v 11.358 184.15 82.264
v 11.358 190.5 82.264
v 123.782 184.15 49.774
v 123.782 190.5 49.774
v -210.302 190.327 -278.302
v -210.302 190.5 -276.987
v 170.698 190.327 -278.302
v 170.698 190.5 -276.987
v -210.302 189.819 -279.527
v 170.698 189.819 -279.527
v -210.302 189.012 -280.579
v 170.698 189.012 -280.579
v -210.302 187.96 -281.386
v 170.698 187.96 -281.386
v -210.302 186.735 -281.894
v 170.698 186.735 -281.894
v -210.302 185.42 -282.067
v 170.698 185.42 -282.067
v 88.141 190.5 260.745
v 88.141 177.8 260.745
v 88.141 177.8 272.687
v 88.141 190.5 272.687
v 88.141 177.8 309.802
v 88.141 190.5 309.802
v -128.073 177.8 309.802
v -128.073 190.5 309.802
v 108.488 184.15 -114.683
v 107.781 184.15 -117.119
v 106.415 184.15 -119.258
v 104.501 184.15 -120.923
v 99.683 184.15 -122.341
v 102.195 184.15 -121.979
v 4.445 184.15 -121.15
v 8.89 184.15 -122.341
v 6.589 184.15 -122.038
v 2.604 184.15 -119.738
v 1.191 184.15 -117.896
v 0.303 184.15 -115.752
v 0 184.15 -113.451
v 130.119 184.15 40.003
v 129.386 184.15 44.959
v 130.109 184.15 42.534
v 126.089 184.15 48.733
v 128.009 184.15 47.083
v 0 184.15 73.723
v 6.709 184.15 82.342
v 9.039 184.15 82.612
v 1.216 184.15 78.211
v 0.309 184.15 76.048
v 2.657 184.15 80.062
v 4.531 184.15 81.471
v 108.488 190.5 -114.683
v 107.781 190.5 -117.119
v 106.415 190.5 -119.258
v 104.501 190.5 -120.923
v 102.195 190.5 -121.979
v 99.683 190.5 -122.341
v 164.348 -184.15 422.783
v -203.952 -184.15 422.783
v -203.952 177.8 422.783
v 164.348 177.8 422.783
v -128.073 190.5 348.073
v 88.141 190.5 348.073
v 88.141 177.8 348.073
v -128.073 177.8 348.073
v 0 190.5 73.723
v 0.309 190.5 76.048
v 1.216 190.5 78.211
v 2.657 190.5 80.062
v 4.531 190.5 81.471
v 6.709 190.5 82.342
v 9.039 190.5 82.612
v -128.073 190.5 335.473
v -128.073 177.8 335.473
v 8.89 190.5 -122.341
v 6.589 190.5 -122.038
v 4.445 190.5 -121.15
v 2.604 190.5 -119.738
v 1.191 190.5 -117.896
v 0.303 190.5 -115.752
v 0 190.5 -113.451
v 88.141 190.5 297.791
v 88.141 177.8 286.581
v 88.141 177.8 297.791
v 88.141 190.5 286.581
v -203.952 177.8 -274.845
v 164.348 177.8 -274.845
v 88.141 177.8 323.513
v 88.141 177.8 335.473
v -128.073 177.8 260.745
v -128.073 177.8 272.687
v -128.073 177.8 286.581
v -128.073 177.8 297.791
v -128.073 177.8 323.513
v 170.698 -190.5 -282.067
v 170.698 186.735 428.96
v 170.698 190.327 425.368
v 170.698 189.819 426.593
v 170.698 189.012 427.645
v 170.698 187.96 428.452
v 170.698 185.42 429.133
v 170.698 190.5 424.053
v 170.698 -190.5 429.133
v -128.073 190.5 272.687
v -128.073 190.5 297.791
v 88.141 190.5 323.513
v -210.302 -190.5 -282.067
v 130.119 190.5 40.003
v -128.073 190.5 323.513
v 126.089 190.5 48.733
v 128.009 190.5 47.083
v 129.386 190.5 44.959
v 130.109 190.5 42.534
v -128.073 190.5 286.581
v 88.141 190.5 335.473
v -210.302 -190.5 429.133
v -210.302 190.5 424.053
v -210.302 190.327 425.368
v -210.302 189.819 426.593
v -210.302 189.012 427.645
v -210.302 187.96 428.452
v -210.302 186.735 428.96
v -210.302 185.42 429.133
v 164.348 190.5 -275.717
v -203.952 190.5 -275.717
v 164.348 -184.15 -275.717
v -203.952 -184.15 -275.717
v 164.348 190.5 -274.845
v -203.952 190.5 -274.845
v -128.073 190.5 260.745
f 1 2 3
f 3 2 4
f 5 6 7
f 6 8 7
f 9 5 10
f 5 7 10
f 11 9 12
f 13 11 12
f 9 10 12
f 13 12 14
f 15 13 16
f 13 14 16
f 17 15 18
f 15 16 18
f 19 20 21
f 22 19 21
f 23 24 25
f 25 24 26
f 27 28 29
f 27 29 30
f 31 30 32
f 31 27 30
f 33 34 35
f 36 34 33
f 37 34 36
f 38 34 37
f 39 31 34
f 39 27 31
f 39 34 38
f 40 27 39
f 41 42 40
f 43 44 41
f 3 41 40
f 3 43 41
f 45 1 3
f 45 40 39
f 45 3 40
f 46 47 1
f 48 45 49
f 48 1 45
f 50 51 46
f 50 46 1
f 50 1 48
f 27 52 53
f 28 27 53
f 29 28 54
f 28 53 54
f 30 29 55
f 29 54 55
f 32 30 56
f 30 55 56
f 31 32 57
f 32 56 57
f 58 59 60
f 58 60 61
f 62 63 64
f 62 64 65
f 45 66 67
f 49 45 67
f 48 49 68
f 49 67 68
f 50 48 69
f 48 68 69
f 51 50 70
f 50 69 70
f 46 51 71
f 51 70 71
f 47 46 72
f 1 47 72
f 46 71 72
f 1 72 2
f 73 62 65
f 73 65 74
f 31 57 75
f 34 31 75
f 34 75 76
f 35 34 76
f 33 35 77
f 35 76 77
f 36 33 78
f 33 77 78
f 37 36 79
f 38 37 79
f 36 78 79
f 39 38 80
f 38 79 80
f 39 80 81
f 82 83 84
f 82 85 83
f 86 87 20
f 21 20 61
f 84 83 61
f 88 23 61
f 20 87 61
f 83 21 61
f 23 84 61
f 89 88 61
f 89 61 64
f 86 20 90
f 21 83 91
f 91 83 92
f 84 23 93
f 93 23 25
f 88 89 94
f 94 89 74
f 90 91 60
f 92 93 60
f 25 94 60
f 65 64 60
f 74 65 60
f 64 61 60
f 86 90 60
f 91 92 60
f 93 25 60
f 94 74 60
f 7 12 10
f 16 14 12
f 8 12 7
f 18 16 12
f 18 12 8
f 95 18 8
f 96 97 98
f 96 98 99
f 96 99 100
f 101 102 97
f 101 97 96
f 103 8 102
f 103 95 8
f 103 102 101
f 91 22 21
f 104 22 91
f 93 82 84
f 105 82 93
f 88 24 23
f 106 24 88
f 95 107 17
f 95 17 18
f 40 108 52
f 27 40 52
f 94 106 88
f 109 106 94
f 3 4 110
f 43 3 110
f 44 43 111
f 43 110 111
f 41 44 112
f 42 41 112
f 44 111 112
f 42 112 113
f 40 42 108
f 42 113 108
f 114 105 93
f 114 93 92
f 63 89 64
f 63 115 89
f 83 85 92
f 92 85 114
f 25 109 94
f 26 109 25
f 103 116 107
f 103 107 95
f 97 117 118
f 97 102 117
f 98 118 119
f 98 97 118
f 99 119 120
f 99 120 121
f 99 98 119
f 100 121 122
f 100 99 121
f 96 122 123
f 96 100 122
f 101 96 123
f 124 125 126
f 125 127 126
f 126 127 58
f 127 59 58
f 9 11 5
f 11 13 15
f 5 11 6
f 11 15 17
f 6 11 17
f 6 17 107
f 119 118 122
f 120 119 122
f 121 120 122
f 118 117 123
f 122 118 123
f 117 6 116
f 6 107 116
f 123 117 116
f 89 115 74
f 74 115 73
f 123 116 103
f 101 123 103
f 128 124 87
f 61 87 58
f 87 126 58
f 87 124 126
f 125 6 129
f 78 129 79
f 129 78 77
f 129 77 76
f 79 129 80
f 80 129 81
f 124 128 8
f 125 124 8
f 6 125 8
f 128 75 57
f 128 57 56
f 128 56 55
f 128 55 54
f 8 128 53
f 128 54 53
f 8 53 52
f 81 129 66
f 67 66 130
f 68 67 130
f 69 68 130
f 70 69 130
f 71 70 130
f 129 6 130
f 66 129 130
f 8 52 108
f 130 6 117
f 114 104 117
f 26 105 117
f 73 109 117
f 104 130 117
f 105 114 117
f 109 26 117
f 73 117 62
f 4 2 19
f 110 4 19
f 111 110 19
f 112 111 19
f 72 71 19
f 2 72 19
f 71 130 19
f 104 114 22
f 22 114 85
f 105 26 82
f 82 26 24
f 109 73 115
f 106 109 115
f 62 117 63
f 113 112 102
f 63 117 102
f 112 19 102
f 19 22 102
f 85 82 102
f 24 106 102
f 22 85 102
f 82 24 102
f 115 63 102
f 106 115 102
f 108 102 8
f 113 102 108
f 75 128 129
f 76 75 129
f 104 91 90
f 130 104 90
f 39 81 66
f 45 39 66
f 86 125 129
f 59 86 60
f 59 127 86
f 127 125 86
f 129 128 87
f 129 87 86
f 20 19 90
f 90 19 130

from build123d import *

# Parameters (mm, degrees)
F0_W     = 381
F0_H     = 711.2
F1_DEPTH = 190.5
F2_T     = -6.35
F4_W     = 374.65
F4_H     = 698.5
F4_W_2   = 216.2134721875
F4_H_2   = 11.9601786137
F4_H_3   = 12.0113417506
F4_H_4   = 13.8943791389
F4_H_5   = 13.2367163897
F5_DEPTH = 6.35
F6_R     = 5.08
F8_DEPTH = 6.35


# Not quite as in the source:
# - a feature names something its author has since deleted; it is built from what else it names


with BuildPart() as f1:
    # F0 (on Front) → F1 (new body, symmetric)
    with BuildSketch(Plane.XZ):
        with Locations((-19.8015896951, 73.5329994828)):
            Rectangle(F0_W, F0_H)
    extrude(amount=F1_DEPTH, both=True)

    # F2
    f2_openings = [f1.faces().sort_by_distance(p)[0] for p in [
        (-19.80159, 190.5, 73.532999),
    ]]
    offset(amount=F2_T, openings=f2_openings)

    # F4 (on offset) → F5 (join, symmetric)
    with BuildSketch(Plane(origin=(0, 184.15, 0), x_dir=(-1, 0, 0), z_dir=(0, 1, 0))):
        with Locations((18.9778648138, 74.4046084881)):
            Rectangle(F4_W, F4_H)
        Polygon((-88.1409570575, 335.4734778404), (-88.1409570575, 348.0727672577), (128.07251513, 348.0727672577), (128.07251513, 335.4734778404), (128.07251513, 323.5132992268), (128.07251513, 309.8019063473), (128.07251513, 297.7905645967), (128.07251513, 286.5811288357), (128.07251513, 272.6867496967), (128.07251513, 260.7450783253), (128.07251513, 247.5083619356), (-88.1409570575, 247.5083619356), (-88.1409570575, 260.7450783253), (-88.1409570575, 272.6867496967), (-88.1409570575, 286.5811288357), (-88.1409570575, 297.7905645967), (-88.1409570575, 309.8019063473), (-88.1409570575, 323.5132992268), align=None, mode=Mode.SUBTRACT)
        with Locations((19.9657790363, 329.4933885336)):
            Rectangle(F4_W_2, F4_H_2)
        with Locations((19.9657790363, 303.796235472)):
            Rectangle(F4_W_2, F4_H_3)
        with Locations((19.9657790363, 279.6339392662)):
            Rectangle(F4_W_2, F4_H_4)
        with Locations((19.9657790363, 254.1267201304)):
            Rectangle(F4_W_2, F4_H_5)
    extrude(amount=F5_DEPTH, both=True)

    # F6
    f6_edges = [f1.edges().sort_by_distance(p)[0] for p in [
        (-19.80159, 190.5, 429.132999),
        (-19.80159, 190.5, -282.067001),
    ]]
    fillet(f6_edges, radius=F6_R)

    # F7 (on face) → F8 (cut)
    with BuildSketch(Plane(origin=(0, 190.5, 0), x_dir=(-1, 0, 0), z_dir=(0, 1, 0))):
        with BuildLine():
            ThreePointArc((-123.7823893566, 49.7743694082), (-128.773401113, 46.0705343361), (-130.1186089124, 40.0026674482))
            Line((-130.1186089124, 40.0026674482), (-108.4877372412, -114.6825799083))
            ThreePointArc((-108.4877372412, -114.6825799083), (-105.5180801987, -120.1587572974), (-99.6834033498, -122.3413996903))
            Line((-99.6834033498, -122.3413996903), (-8.89, -122.3413996903))
            ThreePointArc((-8.89, -122.3413996903), (-2.6038207153, -119.7375789751), (0, -113.4513996903))
            Line((0, -113.4513996903), (0, 73.7231935432))
            ThreePointArc((0, 73.7231935432), (-3.5472215301, 80.8286012177), (-11.3581143356, 82.2637152852))
            Line((-11.3581143356, 82.2637152852), (-123.7823893566, 49.7743694082))
        make_face()
    extrude(amount=-F8_DEPTH, mode=Mode.SUBTRACT)


solid = f1.part
